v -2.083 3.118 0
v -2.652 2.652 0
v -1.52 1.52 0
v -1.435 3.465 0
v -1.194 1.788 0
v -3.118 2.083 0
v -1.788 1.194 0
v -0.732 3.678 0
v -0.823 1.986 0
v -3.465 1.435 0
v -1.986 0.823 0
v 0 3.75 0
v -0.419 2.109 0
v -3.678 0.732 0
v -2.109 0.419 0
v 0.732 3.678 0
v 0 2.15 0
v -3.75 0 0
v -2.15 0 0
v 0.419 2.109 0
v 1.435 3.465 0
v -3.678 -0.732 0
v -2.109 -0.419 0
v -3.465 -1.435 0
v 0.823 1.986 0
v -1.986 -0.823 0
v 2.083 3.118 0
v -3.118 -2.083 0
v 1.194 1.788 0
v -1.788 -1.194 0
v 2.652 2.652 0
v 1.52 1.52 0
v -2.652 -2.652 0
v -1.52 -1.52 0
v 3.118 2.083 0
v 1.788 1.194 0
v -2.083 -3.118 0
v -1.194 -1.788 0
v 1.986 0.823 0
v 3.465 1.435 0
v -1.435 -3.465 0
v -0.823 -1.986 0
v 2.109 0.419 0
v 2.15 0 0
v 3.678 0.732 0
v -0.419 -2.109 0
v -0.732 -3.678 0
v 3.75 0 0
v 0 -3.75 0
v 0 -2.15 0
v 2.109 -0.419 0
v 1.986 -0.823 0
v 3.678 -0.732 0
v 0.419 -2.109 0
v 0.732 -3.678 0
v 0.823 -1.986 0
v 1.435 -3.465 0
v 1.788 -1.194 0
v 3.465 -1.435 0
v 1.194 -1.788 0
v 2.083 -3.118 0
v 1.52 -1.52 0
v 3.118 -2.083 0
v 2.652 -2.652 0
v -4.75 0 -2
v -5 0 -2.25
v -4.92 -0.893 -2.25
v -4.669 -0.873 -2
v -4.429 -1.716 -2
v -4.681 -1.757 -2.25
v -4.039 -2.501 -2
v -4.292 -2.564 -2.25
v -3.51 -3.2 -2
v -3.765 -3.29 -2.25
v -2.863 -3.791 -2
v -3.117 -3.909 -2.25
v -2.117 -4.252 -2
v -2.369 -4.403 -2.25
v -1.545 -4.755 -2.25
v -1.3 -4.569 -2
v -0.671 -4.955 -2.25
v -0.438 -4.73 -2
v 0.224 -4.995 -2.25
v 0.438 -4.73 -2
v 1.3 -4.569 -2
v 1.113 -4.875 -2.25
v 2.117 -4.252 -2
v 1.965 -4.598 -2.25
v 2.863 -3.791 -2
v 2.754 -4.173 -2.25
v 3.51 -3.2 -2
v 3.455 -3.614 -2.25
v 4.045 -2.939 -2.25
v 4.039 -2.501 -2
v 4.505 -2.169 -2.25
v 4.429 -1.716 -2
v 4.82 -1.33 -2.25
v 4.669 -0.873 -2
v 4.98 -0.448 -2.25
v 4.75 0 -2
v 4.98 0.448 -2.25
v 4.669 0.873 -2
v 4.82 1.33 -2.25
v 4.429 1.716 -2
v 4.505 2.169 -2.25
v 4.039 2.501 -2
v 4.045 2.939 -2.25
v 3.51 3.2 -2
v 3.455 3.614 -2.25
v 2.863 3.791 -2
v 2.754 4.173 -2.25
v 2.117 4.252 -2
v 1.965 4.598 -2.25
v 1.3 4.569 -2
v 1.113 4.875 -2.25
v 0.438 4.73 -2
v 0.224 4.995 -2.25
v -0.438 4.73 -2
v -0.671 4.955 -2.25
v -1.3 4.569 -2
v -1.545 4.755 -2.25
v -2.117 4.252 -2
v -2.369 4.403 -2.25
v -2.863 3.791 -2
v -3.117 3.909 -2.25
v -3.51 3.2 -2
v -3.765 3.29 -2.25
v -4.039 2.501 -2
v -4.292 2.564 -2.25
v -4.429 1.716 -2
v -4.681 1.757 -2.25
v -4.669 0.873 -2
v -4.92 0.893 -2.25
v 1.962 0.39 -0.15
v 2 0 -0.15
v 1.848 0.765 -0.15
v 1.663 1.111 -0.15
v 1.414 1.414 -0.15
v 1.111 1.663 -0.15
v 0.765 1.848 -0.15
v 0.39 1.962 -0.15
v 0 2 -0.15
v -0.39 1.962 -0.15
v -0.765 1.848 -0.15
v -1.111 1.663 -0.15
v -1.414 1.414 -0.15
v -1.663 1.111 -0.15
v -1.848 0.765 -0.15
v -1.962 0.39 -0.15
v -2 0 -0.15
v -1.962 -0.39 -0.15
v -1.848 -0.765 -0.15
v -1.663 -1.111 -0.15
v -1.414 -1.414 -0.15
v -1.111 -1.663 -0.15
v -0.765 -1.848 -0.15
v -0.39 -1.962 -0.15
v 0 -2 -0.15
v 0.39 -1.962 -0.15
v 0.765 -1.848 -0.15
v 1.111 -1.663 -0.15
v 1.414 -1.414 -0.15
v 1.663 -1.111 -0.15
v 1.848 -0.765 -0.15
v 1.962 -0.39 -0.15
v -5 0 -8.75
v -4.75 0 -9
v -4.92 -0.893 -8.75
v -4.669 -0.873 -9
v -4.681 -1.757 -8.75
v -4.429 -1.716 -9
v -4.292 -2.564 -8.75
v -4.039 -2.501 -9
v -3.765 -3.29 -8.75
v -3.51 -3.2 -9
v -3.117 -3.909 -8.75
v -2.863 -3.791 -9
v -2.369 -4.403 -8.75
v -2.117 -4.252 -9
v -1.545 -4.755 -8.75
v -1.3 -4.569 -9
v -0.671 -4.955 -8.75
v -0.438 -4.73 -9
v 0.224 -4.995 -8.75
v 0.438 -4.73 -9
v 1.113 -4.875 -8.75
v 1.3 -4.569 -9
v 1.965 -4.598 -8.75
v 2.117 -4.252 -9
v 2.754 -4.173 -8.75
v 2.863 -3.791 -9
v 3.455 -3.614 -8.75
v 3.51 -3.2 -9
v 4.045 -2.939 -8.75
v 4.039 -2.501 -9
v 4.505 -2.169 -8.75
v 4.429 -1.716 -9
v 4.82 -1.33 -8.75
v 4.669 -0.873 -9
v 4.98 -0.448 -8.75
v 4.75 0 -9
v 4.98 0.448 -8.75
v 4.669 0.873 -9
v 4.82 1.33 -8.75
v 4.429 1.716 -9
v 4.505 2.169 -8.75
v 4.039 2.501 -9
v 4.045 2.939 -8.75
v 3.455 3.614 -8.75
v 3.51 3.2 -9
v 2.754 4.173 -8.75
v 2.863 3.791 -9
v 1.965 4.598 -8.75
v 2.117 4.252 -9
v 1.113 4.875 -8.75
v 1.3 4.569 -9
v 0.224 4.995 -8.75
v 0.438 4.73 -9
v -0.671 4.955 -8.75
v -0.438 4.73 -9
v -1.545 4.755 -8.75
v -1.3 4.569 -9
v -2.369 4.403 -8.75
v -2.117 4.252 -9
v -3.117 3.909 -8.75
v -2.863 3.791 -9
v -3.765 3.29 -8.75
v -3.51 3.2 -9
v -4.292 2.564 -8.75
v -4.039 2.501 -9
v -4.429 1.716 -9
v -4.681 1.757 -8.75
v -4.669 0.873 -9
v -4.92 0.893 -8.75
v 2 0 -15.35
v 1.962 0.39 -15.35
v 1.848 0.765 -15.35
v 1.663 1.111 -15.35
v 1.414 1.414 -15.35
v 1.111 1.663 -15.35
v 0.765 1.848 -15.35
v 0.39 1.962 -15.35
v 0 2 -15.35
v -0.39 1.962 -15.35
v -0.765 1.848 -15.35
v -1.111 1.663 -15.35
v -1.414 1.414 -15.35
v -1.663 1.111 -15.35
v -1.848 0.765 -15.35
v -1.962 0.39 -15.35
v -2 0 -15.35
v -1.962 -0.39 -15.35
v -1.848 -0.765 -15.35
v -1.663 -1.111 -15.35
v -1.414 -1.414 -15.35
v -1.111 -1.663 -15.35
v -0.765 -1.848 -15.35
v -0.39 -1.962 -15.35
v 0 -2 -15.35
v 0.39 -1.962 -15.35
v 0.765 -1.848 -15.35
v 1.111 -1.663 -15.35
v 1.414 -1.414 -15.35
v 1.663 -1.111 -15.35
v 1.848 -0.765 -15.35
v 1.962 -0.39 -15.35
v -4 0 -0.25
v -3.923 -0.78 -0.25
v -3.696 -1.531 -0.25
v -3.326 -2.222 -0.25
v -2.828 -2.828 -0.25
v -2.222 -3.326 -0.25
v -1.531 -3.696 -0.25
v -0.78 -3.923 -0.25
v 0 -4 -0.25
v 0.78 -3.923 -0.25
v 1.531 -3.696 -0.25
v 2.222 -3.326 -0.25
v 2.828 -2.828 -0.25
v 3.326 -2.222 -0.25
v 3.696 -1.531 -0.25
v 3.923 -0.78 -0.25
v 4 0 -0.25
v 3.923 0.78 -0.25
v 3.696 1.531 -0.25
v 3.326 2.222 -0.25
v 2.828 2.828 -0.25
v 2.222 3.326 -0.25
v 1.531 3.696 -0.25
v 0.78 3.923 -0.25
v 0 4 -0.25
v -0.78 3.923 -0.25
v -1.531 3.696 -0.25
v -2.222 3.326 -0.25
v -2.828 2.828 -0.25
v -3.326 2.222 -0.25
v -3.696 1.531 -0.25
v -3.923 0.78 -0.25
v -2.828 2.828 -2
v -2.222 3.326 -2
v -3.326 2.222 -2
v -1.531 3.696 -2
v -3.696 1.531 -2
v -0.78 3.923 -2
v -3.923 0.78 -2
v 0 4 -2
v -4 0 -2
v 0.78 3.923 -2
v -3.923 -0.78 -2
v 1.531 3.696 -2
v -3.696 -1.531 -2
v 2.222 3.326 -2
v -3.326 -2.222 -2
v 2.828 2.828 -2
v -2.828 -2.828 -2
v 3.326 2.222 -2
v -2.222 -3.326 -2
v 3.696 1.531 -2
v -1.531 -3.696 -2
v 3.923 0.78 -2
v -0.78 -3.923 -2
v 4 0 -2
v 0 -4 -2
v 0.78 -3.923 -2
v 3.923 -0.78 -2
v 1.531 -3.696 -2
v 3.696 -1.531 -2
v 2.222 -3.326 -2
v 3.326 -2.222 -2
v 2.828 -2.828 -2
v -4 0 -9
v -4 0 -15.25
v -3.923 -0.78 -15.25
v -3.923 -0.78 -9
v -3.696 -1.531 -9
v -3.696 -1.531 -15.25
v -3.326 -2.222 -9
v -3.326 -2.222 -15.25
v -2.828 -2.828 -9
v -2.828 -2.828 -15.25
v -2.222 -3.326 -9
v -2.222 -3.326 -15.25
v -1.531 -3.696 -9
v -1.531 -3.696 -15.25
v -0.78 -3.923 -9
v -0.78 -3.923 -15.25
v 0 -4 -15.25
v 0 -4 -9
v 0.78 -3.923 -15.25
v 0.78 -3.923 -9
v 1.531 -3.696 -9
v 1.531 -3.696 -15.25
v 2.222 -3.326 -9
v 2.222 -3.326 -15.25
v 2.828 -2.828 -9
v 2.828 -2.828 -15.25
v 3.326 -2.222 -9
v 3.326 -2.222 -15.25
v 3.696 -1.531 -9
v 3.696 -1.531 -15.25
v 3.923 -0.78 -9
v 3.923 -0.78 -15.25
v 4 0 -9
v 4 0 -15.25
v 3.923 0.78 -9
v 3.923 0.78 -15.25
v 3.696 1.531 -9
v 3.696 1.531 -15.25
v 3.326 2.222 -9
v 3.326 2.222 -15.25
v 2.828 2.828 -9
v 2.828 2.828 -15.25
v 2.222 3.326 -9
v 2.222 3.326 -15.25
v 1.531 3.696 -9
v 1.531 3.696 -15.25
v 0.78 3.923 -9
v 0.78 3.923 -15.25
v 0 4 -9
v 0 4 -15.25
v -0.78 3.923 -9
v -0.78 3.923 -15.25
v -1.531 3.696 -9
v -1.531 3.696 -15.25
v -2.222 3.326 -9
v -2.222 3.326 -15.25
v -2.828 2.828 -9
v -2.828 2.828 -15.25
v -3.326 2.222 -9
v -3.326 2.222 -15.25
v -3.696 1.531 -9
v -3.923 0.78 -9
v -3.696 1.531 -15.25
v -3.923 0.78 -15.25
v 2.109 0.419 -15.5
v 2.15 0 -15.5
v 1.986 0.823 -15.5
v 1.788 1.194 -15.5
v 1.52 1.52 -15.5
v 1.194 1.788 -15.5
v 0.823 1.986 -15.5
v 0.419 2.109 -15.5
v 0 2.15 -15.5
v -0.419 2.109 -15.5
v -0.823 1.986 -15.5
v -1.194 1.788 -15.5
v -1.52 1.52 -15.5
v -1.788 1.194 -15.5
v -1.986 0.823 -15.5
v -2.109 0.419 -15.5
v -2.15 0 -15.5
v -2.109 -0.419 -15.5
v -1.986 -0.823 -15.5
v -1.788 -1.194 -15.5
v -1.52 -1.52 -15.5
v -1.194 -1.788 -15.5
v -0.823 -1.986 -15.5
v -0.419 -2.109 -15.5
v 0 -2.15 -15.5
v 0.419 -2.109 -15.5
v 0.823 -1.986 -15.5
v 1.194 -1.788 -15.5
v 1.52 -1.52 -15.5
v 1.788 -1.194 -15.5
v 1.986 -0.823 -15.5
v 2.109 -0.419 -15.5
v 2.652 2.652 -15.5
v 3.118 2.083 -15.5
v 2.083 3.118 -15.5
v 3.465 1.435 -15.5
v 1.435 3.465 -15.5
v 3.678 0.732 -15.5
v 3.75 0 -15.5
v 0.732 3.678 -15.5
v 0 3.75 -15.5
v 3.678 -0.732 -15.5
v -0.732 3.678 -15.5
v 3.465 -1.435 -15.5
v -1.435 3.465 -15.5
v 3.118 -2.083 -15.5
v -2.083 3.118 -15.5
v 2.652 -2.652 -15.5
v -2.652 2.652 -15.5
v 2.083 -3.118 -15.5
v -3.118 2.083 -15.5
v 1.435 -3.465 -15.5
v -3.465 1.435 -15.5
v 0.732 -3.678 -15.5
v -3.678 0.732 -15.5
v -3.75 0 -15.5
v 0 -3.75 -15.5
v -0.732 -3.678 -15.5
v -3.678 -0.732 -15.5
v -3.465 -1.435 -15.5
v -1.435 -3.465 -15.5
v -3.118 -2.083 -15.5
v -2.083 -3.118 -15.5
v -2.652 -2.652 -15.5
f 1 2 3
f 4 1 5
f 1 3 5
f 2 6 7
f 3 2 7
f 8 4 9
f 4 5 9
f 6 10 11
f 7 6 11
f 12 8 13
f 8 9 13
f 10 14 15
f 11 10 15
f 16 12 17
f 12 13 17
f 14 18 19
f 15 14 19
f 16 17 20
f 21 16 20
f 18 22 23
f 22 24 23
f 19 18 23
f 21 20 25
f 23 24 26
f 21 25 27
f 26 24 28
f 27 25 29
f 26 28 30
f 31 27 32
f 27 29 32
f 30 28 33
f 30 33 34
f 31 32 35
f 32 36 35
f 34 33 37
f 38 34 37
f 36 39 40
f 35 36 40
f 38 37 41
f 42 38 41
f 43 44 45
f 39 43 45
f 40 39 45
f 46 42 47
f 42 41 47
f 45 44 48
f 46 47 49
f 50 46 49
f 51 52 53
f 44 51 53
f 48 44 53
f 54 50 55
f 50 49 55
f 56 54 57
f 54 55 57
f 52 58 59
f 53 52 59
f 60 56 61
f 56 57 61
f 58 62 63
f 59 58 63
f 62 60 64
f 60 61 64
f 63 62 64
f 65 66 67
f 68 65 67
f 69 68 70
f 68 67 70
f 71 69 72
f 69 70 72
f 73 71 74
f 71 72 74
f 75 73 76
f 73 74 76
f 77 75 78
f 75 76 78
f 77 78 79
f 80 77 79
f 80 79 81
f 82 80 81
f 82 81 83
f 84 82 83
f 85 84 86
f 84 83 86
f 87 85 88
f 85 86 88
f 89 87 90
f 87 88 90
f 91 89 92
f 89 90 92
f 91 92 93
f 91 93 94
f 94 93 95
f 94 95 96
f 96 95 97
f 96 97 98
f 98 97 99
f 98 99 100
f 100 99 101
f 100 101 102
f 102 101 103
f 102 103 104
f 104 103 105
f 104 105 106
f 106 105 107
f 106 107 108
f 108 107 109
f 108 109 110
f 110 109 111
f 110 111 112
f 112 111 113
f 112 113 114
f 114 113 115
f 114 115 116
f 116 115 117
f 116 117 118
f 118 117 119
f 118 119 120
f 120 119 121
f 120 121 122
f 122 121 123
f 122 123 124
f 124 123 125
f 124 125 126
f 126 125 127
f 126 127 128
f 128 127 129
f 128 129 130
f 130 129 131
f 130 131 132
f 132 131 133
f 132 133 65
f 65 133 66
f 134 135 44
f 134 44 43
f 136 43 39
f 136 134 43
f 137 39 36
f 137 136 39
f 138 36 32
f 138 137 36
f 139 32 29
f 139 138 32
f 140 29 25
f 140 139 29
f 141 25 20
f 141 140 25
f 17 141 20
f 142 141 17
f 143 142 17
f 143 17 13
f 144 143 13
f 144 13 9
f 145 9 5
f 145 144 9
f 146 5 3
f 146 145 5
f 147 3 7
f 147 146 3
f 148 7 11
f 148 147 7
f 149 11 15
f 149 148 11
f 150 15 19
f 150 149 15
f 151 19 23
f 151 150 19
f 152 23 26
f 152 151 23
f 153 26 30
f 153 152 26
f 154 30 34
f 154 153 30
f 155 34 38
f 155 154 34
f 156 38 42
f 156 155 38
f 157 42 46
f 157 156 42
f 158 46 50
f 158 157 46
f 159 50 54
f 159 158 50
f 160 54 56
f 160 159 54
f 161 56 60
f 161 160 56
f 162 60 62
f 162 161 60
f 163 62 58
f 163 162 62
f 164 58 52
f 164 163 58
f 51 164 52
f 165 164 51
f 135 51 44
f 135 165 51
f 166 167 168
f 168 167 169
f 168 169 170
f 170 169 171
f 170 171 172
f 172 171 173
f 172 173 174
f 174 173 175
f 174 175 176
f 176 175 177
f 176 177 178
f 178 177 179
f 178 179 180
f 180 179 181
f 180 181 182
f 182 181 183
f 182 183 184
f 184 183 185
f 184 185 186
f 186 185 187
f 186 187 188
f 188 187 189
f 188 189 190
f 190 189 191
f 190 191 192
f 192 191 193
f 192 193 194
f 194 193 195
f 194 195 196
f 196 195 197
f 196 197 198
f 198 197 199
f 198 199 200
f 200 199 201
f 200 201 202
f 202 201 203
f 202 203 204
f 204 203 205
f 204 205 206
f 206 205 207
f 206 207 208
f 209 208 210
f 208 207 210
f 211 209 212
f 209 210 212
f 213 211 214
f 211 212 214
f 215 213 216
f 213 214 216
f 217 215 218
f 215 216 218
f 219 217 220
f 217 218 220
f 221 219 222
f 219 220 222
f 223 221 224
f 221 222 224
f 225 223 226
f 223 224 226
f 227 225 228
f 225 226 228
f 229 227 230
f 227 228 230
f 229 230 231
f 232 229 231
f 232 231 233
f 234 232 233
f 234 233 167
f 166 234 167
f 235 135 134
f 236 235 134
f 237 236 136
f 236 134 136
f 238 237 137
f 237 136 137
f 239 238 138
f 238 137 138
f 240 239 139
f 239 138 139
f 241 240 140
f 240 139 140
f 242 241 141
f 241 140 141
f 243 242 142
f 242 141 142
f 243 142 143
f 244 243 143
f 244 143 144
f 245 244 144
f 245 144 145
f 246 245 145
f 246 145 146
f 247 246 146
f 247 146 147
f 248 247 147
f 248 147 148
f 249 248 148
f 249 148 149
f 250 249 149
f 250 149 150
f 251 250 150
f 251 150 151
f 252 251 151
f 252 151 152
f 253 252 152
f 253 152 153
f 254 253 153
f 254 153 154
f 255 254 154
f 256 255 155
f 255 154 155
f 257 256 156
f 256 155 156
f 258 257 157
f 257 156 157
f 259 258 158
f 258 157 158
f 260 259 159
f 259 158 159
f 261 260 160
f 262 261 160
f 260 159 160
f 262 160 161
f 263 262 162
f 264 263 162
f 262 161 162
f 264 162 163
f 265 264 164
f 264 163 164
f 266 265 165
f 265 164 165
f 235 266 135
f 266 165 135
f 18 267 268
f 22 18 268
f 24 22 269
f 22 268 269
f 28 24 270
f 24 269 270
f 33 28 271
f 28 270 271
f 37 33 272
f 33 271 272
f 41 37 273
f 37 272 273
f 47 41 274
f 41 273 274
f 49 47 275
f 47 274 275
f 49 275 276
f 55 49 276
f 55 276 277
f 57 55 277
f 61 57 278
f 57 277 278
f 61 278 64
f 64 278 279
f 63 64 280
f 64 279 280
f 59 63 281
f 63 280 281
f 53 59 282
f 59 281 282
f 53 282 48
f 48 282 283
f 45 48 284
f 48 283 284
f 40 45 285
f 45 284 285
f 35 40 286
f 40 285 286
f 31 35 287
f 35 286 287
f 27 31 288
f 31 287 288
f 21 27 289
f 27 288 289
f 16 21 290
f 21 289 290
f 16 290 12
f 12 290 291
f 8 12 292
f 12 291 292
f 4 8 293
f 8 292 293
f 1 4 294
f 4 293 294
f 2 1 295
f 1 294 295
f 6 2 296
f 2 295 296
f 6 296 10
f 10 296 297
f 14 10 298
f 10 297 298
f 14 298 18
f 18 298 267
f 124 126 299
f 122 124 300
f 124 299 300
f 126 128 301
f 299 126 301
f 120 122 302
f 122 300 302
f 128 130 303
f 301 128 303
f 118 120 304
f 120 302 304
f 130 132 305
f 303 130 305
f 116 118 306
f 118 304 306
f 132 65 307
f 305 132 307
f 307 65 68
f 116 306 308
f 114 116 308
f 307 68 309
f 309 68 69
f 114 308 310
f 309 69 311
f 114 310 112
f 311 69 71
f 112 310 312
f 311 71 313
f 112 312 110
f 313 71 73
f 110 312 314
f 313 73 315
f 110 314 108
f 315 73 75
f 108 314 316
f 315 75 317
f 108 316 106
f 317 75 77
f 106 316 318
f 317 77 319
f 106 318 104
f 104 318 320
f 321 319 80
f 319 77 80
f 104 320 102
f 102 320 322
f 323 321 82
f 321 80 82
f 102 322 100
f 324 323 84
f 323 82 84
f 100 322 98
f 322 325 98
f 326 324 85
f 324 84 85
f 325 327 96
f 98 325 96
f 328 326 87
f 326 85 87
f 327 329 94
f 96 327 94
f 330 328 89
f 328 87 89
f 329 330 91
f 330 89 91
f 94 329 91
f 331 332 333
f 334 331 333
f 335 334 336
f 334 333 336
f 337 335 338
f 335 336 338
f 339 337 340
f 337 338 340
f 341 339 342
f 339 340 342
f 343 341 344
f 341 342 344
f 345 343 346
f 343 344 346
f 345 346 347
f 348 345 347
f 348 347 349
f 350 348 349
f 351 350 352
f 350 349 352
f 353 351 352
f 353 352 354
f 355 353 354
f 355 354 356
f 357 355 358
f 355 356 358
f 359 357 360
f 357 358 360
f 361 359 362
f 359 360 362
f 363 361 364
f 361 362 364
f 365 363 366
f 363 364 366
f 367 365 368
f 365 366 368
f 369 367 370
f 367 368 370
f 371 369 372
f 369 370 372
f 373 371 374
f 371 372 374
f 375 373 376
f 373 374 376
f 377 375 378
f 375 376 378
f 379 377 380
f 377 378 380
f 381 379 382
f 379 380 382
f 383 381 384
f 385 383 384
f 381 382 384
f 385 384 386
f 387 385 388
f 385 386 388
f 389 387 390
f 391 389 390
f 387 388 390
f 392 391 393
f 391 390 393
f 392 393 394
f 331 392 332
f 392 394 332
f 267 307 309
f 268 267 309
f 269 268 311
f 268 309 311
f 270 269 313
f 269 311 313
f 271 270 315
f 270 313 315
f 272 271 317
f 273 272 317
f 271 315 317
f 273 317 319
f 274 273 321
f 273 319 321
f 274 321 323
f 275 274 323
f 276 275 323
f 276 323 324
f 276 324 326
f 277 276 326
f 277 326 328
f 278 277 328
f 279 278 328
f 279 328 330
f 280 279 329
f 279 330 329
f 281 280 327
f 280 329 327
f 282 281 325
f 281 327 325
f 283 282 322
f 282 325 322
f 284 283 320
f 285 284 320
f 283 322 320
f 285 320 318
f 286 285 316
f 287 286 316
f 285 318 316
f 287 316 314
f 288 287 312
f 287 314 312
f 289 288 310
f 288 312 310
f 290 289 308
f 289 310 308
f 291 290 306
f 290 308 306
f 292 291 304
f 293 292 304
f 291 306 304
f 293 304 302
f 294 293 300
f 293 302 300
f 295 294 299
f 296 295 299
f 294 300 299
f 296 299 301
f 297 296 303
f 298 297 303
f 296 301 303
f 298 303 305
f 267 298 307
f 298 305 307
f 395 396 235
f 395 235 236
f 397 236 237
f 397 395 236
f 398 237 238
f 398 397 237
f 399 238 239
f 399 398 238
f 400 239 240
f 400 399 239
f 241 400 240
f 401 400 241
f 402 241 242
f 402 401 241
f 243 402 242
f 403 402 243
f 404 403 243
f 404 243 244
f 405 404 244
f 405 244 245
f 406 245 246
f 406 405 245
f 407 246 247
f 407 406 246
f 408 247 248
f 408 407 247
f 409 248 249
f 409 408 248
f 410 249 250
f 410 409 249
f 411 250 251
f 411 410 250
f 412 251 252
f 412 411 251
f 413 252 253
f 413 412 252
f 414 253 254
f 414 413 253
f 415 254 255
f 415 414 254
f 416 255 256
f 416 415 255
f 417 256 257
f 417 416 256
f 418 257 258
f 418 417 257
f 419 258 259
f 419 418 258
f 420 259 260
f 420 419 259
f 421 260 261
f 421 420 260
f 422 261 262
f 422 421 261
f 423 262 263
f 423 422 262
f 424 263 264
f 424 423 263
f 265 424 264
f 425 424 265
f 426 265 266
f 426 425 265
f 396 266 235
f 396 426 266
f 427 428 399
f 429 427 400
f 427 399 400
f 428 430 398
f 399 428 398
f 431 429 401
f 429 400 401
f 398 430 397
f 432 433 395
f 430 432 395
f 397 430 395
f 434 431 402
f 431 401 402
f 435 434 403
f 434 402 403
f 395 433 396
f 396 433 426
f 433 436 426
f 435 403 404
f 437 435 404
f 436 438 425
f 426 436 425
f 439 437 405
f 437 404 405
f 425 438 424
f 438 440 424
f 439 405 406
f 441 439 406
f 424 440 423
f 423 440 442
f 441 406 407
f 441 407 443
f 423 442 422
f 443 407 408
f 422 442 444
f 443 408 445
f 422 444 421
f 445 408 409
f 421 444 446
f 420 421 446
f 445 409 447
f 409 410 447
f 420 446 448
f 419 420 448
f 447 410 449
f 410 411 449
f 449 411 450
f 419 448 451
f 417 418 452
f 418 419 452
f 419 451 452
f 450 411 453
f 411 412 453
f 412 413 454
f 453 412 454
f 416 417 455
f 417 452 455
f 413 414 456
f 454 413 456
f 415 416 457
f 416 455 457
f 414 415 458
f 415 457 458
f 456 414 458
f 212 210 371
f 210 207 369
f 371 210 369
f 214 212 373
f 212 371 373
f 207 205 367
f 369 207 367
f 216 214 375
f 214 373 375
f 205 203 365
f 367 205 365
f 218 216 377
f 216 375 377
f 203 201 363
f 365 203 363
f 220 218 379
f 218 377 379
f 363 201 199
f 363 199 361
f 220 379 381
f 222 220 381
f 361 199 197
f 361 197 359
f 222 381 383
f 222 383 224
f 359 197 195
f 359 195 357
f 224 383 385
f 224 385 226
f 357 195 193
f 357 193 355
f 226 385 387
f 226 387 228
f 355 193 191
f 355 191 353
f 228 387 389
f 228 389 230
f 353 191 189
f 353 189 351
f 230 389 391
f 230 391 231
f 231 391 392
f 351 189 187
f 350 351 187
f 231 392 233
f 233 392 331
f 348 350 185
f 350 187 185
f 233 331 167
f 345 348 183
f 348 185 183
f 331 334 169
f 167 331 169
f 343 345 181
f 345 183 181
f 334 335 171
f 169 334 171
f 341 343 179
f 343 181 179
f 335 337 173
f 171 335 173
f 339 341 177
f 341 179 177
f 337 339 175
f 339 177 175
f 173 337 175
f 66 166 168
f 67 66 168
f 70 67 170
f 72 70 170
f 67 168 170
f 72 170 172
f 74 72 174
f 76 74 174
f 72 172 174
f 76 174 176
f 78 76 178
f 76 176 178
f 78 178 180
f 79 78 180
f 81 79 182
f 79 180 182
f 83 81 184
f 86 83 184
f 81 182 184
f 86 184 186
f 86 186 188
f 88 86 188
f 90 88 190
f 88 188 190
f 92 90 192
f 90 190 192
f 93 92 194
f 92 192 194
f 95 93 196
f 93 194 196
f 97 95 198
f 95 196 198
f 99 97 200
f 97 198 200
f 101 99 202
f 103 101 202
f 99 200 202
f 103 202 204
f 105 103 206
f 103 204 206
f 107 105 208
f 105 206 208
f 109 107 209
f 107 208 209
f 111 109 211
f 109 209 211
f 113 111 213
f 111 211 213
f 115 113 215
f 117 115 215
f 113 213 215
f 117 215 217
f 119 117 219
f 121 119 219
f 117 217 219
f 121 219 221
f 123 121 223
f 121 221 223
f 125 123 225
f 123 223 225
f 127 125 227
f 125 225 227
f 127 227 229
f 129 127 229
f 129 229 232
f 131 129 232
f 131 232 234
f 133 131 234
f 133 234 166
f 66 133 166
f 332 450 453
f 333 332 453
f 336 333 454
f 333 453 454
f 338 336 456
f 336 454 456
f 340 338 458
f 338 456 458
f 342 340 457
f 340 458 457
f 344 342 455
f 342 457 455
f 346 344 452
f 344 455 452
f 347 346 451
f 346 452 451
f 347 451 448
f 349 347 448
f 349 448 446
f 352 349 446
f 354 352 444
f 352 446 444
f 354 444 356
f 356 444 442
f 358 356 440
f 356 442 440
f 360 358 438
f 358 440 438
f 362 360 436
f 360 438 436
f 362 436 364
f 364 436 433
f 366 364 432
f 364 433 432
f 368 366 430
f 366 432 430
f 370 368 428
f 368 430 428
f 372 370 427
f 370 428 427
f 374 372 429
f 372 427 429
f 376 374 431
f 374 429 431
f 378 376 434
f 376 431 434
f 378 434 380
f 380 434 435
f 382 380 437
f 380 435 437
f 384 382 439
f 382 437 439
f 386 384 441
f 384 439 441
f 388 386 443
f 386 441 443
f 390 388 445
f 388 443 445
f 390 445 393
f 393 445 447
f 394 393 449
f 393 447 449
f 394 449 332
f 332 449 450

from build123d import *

# Parameters (mm, degrees)
CHAMFER_1_SIZE      = 0.25
SKETCH_2_R          = 2
CUT_EXTRUDE_1_DEPTH = 18.036725037
CHAMFER_2_SIZE      = 0.15


with BuildPart() as part:
    # ｽｹｯﾁ1 → 回転1 (revolve)
    with BuildSketch(Plane(origin=(0, 0, 0), x_dir=(0, 0, -1), z_dir=(1, 0, 0)), mode=Mode.PRIVATE) as revolve_1_sk:
        Polygon((0, 0), (0, 4), (2, 4), (2, 5), (9, 5), (9, 4), (15.5, 4), (15.5, 0), align=None)
    revolve(revolve_1_sk.sketch.rotate(Axis((0, 0, -15.5), (0, 0, 1)), 90), axis=Axis((0, 0, -15.5), (0, 0, 1)))

    # 面取り1
    chamfer_1_edges = [part.edges().sort_by_distance(p)[0] for p in [
        (4, 0, -15.5),
        (5, 0, -9),
        (5, 0, -2),
        (4, 0, 0),
    ]]
    chamfer(chamfer_1_edges, length=CHAMFER_1_SIZE)

    # ｽｹｯﾁ2 → ｶｯﾄ - 押し出し1 (cut, through all)
    with BuildSketch(Plane.XY):
        Circle(SKETCH_2_R)
    extrude(amount=-CUT_EXTRUDE_1_DEPTH, mode=Mode.SUBTRACT)

    # 面取り2
    chamfer_2_edges = [part.edges().sort_by_distance(p)[0] for p in [
        (-2, 0, -15.5),
        (-2, 0, 0),
    ]]
    chamfer(chamfer_2_edges, length=CHAMFER_2_SIZE)


solid = part.part
